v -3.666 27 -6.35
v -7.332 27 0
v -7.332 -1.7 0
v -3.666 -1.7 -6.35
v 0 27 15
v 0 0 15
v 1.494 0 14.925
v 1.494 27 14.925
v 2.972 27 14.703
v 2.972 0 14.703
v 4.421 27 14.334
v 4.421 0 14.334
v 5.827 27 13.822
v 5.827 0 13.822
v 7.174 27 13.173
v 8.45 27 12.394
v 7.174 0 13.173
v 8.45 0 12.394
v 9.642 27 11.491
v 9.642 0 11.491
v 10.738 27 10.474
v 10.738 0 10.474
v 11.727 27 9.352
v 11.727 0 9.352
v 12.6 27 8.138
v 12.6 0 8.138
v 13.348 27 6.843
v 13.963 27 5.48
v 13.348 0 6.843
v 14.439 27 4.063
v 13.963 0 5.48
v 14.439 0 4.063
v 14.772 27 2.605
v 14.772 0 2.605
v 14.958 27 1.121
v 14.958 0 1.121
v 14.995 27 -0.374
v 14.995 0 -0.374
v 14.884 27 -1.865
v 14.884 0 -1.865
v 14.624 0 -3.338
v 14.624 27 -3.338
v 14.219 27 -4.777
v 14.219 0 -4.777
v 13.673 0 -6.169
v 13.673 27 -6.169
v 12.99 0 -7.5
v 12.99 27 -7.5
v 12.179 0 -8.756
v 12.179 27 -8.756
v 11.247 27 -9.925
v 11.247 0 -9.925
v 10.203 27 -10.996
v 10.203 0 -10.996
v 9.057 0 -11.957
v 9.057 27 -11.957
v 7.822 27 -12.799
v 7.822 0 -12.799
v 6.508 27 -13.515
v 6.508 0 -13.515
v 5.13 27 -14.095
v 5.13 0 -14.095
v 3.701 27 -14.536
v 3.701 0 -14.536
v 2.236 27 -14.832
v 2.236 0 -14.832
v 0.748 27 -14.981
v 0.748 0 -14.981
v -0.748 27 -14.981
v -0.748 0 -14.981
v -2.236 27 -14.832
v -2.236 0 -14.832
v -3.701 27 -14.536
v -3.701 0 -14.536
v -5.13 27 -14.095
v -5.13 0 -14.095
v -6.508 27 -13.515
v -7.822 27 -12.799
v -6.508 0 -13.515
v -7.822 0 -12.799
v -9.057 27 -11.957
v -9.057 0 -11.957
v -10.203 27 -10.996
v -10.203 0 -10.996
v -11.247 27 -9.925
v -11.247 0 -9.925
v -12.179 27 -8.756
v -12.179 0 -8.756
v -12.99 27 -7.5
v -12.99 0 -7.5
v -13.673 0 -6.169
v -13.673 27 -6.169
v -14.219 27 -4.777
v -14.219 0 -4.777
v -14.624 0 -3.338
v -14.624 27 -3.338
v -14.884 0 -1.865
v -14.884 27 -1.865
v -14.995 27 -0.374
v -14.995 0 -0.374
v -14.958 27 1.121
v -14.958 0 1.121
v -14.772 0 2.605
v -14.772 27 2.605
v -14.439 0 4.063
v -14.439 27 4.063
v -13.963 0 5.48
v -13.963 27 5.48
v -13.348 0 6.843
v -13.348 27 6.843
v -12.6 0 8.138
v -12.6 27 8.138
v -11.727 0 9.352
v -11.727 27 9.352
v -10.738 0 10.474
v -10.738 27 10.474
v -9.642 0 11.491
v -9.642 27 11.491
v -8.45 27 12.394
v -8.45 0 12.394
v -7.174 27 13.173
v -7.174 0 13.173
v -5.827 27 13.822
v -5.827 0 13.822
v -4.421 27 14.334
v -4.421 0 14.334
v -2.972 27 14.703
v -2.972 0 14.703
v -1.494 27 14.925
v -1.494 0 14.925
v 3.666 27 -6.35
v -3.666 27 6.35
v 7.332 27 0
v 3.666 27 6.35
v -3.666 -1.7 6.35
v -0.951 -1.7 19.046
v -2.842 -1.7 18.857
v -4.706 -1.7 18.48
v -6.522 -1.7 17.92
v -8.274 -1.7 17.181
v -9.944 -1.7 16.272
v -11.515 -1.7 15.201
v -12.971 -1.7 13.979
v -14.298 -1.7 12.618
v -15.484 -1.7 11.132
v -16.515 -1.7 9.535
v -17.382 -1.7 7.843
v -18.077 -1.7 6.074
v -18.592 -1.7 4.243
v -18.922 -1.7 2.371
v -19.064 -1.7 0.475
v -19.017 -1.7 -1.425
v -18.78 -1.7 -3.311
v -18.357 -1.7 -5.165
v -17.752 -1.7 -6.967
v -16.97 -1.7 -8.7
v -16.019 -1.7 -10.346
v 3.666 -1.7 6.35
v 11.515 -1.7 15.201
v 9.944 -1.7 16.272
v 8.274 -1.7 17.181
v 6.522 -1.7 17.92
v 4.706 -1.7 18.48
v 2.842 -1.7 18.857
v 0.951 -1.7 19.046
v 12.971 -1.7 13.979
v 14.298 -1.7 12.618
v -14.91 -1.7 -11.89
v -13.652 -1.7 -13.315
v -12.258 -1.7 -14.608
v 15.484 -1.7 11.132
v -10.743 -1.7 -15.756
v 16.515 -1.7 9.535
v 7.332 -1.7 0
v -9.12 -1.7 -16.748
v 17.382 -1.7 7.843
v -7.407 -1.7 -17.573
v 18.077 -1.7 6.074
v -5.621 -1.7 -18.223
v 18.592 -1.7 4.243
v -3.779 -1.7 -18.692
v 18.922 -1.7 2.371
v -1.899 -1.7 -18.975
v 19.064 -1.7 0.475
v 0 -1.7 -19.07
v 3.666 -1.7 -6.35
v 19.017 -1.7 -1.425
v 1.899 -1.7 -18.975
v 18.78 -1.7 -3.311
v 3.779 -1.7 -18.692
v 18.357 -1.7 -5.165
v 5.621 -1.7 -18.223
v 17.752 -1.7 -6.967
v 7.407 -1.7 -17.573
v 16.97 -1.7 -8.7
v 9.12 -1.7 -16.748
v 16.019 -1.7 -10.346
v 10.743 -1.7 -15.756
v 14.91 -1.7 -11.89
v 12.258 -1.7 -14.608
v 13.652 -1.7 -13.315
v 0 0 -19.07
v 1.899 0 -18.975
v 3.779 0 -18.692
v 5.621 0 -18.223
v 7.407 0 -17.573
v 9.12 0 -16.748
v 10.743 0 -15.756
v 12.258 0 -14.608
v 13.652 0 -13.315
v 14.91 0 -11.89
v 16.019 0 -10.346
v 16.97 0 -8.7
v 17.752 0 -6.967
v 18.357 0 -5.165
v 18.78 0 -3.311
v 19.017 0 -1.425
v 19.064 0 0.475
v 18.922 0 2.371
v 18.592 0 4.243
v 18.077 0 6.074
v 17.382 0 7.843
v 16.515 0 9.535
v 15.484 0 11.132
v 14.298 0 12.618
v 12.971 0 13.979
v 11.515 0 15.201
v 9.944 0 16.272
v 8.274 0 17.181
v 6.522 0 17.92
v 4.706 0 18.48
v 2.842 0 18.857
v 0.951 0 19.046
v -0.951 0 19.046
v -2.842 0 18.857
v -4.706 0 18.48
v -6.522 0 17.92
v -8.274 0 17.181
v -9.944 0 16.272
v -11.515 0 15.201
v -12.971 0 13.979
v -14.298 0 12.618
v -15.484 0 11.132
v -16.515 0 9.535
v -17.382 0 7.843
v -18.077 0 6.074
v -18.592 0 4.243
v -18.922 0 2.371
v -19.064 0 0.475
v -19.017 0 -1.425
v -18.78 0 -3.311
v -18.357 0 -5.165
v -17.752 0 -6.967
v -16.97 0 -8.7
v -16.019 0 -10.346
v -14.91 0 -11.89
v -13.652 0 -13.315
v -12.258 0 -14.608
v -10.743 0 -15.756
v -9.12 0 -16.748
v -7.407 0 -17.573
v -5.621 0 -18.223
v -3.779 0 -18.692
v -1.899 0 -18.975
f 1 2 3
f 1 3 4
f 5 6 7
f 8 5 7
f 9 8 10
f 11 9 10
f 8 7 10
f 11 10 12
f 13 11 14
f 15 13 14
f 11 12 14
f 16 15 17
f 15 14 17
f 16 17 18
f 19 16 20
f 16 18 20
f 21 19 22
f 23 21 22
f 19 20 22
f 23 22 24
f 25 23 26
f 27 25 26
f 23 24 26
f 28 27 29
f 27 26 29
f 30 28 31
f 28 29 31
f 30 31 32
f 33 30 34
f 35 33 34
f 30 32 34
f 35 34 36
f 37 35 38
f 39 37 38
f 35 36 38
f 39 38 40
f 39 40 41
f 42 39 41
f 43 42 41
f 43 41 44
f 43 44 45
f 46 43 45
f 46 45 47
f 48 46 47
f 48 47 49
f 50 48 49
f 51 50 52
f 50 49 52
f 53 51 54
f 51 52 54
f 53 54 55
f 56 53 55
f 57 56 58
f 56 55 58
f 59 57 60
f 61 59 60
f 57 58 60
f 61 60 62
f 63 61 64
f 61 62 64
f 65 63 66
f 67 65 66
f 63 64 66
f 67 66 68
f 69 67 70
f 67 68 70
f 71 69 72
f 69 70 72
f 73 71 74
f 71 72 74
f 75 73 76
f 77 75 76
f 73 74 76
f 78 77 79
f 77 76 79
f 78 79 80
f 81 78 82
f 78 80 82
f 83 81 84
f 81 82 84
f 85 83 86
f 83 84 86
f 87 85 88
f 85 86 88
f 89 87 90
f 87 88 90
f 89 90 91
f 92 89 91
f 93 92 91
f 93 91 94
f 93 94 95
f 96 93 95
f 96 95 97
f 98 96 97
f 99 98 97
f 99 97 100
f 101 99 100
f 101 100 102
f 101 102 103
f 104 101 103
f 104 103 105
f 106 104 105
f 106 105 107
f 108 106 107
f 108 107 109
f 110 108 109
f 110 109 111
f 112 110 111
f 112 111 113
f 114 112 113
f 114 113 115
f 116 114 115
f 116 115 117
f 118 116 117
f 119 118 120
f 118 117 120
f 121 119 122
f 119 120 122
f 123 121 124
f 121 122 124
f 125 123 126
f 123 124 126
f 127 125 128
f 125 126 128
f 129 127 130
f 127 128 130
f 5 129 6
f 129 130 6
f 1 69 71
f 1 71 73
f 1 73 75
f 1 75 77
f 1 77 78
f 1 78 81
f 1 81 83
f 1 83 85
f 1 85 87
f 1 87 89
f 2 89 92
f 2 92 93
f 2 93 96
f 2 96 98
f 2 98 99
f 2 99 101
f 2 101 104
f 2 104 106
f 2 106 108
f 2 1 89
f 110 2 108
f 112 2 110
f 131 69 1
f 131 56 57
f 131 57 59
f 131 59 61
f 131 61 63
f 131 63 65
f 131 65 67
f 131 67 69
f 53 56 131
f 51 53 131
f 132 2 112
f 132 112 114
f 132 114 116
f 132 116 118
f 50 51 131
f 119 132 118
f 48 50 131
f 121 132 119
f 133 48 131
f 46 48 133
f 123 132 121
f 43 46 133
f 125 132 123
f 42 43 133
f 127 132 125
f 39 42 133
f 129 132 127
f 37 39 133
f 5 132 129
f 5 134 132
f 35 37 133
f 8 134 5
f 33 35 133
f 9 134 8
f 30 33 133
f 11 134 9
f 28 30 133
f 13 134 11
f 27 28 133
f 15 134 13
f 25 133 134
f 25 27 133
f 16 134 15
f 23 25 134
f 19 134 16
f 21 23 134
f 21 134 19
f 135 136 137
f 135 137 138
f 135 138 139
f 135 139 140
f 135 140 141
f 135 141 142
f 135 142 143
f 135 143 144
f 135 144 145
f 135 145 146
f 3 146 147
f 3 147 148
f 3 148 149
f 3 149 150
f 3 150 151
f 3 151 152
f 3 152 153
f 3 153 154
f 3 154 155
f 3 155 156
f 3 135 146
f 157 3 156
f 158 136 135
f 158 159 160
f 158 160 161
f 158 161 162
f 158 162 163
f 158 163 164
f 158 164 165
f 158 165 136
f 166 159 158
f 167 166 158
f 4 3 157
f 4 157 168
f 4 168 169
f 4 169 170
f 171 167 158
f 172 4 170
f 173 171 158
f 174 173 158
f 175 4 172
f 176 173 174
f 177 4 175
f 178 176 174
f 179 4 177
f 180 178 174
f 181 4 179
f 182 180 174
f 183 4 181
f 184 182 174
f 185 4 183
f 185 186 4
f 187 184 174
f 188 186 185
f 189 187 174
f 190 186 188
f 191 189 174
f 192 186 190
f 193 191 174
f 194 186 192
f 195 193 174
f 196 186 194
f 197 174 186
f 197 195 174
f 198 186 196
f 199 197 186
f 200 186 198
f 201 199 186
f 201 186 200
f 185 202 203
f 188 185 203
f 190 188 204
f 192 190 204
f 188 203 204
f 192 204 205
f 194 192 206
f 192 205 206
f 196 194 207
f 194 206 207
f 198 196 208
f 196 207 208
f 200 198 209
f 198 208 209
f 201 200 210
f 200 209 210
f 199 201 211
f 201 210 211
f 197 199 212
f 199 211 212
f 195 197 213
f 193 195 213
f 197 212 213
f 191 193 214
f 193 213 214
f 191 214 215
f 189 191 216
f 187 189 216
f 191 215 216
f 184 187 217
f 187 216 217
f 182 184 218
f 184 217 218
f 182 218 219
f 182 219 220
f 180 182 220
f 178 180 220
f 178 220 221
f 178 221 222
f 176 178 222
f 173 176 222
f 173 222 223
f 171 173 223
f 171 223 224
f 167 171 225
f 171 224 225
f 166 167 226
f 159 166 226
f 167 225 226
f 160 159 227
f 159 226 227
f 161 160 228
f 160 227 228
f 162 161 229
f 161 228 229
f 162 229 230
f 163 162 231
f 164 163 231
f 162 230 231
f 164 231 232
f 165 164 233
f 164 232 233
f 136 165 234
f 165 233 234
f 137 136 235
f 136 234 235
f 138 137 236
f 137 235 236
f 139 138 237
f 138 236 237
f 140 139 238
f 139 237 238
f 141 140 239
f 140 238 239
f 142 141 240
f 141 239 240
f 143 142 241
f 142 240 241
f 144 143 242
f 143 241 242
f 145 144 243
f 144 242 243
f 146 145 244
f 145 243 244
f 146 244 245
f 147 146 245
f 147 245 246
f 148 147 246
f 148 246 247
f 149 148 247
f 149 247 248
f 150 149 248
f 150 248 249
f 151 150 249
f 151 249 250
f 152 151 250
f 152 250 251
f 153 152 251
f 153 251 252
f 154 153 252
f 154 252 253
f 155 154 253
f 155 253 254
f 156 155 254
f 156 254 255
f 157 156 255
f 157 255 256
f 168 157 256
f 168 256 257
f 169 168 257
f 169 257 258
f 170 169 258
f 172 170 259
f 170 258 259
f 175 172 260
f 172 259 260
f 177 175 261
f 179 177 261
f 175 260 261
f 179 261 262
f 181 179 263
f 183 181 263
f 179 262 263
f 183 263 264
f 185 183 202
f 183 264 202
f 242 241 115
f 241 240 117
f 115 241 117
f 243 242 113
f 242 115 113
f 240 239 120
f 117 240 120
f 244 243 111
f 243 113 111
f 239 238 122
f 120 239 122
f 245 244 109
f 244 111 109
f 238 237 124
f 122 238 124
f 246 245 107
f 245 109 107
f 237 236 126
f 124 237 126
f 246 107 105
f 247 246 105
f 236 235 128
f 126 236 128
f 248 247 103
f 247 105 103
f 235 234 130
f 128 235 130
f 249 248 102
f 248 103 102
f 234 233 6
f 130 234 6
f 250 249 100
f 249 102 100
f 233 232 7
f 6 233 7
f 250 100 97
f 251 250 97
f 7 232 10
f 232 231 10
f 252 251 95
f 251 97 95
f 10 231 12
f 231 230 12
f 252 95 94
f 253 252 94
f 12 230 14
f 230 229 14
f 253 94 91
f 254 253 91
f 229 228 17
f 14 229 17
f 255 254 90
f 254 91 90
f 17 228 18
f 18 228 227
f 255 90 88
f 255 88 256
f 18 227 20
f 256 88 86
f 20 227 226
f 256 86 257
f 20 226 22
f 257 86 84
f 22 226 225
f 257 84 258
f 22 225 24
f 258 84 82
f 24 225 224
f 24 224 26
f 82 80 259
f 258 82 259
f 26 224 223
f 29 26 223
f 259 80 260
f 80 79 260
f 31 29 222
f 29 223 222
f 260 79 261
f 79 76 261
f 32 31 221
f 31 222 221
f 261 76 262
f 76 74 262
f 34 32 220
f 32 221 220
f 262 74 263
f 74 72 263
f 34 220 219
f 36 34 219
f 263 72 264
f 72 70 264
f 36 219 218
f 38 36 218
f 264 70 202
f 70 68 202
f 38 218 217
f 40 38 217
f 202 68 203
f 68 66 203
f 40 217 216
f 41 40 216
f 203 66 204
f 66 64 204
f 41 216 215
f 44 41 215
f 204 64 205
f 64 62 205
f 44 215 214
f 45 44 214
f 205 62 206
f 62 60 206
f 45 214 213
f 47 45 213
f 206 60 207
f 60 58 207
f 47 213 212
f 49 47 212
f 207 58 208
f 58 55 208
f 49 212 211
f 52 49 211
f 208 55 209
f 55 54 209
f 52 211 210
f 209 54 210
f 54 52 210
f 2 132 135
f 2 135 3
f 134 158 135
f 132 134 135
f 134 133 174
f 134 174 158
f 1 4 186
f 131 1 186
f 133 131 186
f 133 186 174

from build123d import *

# Parameters (mm, degrees)
SKETCH1_R           = 15
BOSS_EXTRUDE1_DEPTH = 27
SKETCH2_R           = 19.07
BOSS_EXTRUDE2_DEPTH = 1.7
CUT_EXTRUDE1_DEPTH  = 40.382988713


with BuildPart() as part:
    # Sketch1 → Boss-Extrude1 (new body)
    with BuildSketch(Plane(origin=(0, 0, 0), x_dir=(1, 0, 0), z_dir=(0, 1, 0))):
        with Locations(Location((0, 0, 0), (0, 0, 270))):
            Circle(SKETCH1_R)
    extrude(amount=BOSS_EXTRUDE1_DEPTH)

    # Sketch2 → Boss-Extrude2 (add)
    with BuildSketch(Plane.XZ):
        with Locations(Location((0, 0, 0), (0, 0, 270))):
            Circle(SKETCH2_R)
    extrude(amount=BOSS_EXTRUDE2_DEPTH)

    # Sketch3 → Cut-Extrude1 (cut, through all)
    with BuildSketch(Plane.XZ.offset(1.7)):
        Polygon((-3.666174209, 6.35), (-7.332348419, 0), (-3.666174209, -6.35), (3.666174209, -6.35), (7.332348419, 0), (3.666174209, 6.35), align=None)
    extrude(amount=-CUT_EXTRUDE1_DEPTH, mode=Mode.SUBTRACT)


solid = part.part
